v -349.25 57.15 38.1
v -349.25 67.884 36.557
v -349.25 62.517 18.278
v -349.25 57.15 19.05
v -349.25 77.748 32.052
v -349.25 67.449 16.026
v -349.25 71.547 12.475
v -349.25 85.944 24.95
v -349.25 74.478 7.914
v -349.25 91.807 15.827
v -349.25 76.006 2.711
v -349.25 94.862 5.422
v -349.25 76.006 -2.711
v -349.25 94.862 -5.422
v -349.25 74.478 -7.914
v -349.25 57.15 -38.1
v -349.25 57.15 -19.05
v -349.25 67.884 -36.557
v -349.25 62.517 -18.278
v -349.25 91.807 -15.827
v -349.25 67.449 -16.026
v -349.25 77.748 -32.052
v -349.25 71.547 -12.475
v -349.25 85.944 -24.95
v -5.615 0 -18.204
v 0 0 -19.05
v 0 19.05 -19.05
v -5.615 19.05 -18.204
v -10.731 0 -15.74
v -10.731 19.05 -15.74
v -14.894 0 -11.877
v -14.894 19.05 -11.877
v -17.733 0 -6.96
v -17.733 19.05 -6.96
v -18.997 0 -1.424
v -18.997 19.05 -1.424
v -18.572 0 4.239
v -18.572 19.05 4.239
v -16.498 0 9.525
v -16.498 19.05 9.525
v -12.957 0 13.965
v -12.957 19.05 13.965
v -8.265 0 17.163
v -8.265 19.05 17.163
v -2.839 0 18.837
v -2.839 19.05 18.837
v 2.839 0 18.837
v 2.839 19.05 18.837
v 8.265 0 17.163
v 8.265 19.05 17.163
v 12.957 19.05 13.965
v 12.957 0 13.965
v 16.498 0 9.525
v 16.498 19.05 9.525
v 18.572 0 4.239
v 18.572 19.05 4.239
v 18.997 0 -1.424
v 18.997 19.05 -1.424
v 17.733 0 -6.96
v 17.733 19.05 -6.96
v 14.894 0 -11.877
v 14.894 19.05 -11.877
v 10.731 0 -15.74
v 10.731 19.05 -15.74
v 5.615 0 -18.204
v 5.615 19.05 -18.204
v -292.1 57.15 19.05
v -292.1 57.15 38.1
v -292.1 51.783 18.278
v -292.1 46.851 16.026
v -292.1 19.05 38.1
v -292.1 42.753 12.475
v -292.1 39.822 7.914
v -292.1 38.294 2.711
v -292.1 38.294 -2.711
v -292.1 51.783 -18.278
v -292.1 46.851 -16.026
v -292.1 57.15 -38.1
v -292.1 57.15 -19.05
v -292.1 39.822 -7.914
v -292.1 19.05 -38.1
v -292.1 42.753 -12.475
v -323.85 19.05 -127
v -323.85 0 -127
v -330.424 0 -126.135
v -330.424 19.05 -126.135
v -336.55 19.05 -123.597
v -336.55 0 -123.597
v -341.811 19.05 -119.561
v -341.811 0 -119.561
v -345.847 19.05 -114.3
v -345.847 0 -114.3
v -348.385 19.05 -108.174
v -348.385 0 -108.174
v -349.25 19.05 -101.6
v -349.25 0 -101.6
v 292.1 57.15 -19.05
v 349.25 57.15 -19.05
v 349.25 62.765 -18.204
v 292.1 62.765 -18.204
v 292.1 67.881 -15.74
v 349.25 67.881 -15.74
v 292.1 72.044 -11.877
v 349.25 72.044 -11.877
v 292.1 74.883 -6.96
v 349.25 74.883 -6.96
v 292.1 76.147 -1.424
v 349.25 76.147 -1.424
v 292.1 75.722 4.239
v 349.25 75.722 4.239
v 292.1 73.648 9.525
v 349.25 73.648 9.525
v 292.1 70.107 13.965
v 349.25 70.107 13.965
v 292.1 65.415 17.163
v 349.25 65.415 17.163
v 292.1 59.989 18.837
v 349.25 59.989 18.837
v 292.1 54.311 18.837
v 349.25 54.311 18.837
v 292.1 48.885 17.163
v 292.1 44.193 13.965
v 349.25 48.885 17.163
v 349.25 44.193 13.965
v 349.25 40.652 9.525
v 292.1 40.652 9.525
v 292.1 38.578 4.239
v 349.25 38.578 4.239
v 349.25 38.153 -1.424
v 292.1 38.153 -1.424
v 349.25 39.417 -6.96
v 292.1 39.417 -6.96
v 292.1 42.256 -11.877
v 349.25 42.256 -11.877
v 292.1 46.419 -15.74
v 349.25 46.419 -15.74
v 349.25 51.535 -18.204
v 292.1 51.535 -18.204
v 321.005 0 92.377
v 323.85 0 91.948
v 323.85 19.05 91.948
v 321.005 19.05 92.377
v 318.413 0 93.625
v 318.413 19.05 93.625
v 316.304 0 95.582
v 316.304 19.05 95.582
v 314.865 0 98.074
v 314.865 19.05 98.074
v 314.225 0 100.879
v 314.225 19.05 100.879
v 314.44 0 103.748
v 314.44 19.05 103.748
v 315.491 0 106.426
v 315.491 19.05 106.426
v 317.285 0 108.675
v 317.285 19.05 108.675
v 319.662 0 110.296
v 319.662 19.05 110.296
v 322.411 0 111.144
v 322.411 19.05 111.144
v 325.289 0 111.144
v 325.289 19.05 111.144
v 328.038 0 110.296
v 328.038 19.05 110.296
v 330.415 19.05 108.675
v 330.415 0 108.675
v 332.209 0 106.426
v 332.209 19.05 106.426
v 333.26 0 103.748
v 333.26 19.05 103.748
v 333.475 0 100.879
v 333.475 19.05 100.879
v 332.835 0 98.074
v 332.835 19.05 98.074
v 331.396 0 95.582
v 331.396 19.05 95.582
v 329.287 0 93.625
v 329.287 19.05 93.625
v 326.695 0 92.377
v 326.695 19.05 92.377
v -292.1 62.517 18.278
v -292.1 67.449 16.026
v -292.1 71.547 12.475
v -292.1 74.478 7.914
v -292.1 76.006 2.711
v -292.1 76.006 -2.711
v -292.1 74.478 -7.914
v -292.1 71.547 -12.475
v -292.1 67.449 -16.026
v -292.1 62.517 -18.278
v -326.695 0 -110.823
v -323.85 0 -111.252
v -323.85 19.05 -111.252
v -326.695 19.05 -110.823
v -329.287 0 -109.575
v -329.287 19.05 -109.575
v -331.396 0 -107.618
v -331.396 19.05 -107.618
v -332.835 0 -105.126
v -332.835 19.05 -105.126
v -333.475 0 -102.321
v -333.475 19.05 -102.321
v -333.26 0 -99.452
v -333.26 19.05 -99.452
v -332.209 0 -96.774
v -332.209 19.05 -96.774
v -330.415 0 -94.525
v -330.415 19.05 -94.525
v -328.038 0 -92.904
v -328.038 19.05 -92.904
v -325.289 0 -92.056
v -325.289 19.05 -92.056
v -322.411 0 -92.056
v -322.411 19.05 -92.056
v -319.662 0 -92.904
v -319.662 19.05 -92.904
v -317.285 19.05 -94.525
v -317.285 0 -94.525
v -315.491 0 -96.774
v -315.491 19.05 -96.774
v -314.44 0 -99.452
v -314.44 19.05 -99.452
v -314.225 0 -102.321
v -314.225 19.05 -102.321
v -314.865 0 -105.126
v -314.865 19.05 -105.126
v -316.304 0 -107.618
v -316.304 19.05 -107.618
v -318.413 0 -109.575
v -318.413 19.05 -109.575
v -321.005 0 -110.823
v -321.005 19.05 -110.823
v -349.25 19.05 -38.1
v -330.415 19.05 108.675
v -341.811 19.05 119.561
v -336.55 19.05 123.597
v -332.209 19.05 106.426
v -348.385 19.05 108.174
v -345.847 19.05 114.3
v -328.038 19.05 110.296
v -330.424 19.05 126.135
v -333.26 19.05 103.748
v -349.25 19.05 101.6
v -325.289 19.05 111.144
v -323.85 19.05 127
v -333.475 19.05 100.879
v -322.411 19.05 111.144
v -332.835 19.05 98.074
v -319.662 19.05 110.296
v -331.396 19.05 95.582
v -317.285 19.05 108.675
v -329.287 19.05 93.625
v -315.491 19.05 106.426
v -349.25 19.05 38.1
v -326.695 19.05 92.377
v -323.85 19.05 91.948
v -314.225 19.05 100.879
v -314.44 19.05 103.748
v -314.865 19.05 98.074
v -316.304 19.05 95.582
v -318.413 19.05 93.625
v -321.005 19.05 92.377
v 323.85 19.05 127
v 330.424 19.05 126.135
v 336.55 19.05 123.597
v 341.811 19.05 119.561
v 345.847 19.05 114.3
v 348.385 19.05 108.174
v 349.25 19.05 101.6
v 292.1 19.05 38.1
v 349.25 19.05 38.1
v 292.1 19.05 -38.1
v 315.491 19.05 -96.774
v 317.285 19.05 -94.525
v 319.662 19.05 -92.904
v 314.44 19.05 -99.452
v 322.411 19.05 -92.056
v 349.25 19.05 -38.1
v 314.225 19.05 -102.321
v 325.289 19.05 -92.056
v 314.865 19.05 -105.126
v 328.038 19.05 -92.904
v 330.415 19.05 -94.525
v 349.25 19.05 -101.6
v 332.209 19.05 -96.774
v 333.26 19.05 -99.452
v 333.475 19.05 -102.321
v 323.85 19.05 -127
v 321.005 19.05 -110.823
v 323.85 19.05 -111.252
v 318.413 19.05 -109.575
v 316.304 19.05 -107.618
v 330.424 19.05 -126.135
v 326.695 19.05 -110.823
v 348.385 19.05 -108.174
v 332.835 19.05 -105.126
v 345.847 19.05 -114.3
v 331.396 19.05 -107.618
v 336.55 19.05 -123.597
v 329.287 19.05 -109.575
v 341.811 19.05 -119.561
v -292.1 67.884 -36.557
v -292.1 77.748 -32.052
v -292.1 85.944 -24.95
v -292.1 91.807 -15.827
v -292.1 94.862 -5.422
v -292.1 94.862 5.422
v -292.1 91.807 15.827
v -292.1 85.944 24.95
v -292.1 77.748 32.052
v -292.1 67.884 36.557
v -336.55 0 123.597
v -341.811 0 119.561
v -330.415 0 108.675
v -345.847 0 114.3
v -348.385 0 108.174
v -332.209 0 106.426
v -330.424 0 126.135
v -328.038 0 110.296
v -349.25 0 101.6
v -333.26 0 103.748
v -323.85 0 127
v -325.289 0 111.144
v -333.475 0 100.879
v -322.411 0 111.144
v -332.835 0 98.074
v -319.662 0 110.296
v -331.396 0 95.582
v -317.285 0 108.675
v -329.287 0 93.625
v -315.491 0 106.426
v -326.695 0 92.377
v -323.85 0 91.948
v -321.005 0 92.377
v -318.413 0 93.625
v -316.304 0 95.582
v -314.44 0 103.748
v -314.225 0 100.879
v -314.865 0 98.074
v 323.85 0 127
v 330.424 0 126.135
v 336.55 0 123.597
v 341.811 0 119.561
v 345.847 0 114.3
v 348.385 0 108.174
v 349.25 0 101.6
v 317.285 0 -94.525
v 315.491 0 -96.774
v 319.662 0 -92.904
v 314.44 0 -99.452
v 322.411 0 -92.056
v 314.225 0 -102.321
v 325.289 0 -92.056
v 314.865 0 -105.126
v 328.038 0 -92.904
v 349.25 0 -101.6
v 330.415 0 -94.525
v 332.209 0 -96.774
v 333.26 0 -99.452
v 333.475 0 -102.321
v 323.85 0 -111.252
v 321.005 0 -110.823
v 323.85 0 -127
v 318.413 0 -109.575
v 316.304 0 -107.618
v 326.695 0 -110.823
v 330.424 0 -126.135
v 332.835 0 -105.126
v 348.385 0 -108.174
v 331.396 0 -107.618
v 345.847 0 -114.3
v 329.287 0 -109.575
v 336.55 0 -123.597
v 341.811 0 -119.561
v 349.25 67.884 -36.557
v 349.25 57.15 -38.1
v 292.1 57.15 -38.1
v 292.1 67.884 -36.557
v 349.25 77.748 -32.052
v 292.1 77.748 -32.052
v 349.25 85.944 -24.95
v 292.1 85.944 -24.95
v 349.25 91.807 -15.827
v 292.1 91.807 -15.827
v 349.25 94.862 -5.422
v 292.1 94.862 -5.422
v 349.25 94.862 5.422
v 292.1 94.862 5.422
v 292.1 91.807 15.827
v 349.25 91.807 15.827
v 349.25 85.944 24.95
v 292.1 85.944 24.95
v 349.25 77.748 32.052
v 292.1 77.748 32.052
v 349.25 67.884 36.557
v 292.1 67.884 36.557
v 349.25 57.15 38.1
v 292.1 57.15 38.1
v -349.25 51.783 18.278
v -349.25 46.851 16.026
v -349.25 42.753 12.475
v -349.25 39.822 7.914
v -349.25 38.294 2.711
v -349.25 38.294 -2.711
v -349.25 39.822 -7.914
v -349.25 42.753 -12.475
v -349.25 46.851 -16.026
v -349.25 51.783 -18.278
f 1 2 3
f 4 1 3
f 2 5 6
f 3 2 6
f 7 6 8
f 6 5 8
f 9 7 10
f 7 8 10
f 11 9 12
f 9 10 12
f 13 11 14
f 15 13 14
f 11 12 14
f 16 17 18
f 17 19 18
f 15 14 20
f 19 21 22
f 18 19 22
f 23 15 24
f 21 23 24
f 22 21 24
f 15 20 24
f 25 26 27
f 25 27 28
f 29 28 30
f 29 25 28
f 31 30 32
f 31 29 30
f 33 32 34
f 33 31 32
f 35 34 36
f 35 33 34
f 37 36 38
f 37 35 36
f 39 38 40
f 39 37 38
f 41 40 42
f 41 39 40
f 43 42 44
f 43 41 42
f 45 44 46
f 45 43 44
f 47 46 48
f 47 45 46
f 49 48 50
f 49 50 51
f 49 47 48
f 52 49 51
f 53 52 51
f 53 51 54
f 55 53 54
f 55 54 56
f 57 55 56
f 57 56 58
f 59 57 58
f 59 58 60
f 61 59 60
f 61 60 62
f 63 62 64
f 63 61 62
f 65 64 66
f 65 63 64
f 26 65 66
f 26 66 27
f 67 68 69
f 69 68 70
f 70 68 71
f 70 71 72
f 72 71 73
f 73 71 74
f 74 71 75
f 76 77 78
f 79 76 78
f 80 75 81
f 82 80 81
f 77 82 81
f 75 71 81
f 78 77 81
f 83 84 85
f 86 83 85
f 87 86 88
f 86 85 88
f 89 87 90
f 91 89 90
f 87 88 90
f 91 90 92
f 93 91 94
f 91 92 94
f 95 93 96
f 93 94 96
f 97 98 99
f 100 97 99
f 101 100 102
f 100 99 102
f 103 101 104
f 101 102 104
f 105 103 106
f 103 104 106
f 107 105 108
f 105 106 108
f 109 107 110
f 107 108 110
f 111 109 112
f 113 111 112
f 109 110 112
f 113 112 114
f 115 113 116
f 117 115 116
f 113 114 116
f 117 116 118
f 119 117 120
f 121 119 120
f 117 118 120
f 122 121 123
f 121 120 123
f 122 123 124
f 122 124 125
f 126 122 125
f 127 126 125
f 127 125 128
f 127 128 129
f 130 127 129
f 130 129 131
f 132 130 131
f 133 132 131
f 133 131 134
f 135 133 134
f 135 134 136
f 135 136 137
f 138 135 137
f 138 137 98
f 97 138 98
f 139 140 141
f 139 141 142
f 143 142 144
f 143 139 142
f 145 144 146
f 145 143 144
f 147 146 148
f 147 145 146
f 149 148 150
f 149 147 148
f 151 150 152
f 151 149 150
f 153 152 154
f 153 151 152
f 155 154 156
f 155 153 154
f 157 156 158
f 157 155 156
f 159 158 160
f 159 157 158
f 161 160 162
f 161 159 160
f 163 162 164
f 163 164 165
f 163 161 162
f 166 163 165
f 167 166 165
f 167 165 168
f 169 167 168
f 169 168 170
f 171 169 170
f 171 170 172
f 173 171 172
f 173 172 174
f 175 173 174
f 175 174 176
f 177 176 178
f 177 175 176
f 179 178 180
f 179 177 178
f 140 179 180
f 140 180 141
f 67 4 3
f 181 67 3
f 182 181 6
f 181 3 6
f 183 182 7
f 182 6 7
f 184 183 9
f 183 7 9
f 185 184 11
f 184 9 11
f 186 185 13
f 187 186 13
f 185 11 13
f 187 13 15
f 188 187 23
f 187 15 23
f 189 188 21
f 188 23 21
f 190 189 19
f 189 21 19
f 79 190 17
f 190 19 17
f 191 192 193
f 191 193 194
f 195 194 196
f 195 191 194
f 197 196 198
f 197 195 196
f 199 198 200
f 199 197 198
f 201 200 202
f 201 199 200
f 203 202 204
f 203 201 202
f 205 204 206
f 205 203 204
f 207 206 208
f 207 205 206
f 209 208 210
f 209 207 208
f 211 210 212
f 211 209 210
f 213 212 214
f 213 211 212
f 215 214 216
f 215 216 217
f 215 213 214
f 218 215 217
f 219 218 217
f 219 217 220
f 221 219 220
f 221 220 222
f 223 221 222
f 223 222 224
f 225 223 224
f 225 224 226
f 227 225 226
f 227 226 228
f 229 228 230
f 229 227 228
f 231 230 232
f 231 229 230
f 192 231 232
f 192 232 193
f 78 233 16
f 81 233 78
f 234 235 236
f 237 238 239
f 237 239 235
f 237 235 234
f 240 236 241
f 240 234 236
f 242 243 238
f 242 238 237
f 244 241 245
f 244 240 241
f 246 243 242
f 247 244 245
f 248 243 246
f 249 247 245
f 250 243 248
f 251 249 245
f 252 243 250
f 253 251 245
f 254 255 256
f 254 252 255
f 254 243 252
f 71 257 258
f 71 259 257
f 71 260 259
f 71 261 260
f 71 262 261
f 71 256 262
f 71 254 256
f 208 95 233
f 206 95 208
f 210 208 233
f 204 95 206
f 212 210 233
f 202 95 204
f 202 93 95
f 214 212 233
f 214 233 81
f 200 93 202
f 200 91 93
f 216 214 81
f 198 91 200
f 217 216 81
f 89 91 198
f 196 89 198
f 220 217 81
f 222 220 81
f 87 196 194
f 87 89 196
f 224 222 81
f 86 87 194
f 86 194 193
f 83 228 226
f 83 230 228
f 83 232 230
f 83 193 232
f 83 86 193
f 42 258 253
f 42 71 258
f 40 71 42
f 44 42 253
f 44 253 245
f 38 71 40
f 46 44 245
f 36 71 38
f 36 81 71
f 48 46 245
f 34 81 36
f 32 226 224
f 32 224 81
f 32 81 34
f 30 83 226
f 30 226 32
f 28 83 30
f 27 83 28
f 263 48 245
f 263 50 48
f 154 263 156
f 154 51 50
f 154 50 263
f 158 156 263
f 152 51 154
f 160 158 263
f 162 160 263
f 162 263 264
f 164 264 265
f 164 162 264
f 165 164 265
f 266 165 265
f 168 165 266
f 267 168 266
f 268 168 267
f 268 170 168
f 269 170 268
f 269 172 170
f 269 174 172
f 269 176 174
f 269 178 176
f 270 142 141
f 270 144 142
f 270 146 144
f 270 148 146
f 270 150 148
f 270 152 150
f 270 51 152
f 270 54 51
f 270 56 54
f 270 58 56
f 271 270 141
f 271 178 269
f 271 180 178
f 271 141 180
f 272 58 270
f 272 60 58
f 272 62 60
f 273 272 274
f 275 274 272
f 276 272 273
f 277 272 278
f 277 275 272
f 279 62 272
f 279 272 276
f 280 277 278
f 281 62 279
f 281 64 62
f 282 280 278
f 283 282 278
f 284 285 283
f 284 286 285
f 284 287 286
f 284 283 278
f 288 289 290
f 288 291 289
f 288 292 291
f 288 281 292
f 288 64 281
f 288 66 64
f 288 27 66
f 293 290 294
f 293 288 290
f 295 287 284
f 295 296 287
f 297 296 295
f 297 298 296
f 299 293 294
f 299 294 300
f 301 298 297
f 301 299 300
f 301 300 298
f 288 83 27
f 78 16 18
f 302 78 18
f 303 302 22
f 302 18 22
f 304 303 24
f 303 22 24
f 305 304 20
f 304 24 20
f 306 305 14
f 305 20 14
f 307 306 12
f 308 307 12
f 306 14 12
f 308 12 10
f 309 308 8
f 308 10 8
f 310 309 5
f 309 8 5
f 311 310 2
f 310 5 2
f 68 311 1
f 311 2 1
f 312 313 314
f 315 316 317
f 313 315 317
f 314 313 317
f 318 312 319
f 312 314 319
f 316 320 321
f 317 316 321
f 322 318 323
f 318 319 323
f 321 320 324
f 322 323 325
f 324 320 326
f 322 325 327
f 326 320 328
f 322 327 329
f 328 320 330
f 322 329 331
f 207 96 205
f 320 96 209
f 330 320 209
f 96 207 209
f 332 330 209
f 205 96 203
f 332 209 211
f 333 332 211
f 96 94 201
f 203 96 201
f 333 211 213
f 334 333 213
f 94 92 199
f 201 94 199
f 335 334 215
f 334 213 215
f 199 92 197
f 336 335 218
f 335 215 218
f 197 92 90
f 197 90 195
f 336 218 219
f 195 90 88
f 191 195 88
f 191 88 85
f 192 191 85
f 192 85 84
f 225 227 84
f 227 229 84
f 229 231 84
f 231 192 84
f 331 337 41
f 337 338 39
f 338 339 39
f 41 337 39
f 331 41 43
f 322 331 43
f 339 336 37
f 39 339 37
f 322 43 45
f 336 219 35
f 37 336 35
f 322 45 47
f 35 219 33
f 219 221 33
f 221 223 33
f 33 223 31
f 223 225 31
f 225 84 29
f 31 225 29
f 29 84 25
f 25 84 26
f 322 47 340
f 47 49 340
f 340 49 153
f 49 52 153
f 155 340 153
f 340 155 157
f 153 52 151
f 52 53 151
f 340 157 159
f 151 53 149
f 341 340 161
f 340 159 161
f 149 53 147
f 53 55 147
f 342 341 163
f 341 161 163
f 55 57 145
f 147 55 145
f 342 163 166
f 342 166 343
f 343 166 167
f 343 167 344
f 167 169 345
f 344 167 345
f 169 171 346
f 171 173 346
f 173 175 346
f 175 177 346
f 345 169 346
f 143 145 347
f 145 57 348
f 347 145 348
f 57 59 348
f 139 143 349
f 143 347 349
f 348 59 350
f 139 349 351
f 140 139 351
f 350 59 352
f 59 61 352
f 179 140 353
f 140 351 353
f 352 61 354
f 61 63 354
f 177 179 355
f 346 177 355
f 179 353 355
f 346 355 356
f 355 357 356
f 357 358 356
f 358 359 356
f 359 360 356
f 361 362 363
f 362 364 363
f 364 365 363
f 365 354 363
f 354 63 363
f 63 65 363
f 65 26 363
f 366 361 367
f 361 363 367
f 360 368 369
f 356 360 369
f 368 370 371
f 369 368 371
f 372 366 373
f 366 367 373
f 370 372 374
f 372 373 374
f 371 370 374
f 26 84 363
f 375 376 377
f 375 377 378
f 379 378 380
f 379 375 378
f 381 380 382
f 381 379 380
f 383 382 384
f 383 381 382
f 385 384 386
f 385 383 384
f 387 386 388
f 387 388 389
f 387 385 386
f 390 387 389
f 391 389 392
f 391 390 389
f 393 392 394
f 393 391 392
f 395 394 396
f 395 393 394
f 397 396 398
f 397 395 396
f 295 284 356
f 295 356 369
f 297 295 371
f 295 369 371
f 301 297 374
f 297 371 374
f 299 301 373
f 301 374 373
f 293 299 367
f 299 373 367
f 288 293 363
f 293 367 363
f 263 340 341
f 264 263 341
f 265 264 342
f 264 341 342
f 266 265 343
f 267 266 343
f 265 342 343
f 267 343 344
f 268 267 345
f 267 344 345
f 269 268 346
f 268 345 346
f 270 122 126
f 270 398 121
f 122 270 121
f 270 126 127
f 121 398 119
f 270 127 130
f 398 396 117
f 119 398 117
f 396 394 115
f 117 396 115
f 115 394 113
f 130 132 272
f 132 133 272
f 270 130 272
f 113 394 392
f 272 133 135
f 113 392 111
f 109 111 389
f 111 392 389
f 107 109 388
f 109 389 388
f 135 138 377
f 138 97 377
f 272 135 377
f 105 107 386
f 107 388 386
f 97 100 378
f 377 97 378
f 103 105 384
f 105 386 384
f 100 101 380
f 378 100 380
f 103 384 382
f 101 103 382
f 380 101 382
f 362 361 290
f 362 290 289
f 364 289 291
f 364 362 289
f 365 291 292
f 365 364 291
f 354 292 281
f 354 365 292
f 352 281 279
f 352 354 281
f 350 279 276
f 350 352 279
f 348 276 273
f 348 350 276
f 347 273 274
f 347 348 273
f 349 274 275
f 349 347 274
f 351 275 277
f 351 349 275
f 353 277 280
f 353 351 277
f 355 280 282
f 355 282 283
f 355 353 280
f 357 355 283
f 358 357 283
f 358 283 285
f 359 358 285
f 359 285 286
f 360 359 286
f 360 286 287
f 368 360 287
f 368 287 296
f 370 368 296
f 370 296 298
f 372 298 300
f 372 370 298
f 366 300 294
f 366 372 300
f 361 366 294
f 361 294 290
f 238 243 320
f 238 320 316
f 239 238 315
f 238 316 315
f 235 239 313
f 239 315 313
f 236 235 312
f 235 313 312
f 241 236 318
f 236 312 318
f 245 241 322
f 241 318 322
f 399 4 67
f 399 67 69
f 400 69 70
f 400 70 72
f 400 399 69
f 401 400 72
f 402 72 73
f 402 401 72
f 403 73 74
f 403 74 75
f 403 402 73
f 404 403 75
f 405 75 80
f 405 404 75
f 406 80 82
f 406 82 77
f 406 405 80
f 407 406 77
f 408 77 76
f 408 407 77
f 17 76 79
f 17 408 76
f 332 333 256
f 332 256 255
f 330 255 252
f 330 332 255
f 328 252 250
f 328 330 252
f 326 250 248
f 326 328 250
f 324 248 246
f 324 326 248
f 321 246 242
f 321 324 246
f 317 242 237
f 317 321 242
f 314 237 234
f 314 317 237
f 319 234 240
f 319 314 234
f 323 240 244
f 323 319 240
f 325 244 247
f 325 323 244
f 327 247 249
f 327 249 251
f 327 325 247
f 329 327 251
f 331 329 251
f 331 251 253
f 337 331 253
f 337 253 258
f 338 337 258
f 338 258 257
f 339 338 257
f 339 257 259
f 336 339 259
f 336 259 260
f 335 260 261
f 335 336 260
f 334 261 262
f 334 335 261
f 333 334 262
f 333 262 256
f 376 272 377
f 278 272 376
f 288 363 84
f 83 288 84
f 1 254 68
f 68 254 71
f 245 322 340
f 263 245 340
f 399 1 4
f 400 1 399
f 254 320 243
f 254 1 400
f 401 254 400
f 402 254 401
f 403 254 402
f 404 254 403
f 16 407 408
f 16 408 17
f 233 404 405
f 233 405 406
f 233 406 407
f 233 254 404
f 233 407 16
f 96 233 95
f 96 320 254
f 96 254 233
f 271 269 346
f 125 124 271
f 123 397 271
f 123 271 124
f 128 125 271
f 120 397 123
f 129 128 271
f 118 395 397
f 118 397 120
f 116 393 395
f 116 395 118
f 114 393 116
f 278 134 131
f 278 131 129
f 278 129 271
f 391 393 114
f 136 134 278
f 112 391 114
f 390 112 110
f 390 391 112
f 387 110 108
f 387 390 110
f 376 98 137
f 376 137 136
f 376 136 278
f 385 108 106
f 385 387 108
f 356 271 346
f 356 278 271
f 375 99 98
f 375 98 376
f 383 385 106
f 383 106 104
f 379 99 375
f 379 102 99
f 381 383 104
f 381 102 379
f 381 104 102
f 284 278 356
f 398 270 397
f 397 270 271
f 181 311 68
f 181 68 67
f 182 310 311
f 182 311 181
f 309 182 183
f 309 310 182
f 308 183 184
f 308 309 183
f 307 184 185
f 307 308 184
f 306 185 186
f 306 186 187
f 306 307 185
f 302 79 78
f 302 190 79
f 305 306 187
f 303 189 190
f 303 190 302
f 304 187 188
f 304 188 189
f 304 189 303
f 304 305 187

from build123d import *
from build123d.topology import SkipClean

# Parameters (mm, degrees)
SKETCH1_R           = 9.652
SKETCH1_R_2         = 19.05
BOSS_EXTRUDE1_DEPTH = 19.05
SKETCH1_3_W         = 57.15
SKETCH1_3_H         = 76.2
BOSS_EXTRUDE2_DEPTH = 57.15
BOSS_EXTRUDE3_DEPTH = 57.15
CUT_EXTRUDE2_DEPTH  = 57.15


with BuildPart() as part:
    # Sketch1 → Boss-Extrude1 (new body)
    with BuildSketch(Plane(origin=(0, 0, 0), x_dir=(1, 0, 0), z_dir=(0, 1, 0))):
        with BuildLine():
            ThreePointArc((-349.25, -101.6), (-341.810512242, -119.560512242), (-323.85, -127))
            Line((-323.85, -127), (323.85, -127))
            ThreePointArc((323.85, -127), (341.810512242, -119.560512242), (349.25, -101.6))
            Line((349.25, -101.6), (349.25, -38.1))
            Line((349.25, -38.1), (292.1, -38.1))
            Line((292.1, -38.1), (292.1, 38.1))
            Line((292.1, 38.1), (349.25, 38.1))
            Line((349.25, 38.1), (349.25, 101.6))
            ThreePointArc((349.25, 101.6), (341.810512242, 119.560512242), (323.85, 127))
            Line((323.85, 127), (-323.85, 127))
            ThreePointArc((-323.85, 127), (-341.810512242, 119.560512242), (-349.25, 101.6))
            Line((-349.25, 101.6), (-349.25, 38.1))
            Line((-349.25, 38.1), (-292.1, 38.1))
            Line((-292.1, 38.1), (-292.1, -38.1))
            Line((-292.1, -38.1), (-349.25, -38.1))
            Line((-349.25, -38.1), (-349.25, -101.6))
        make_face()
        with Locations((-323.85, -101.6)):
            Circle(SKETCH1_R, mode=Mode.SUBTRACT)
        with Locations((323.85, -101.6)):
            Circle(SKETCH1_R, mode=Mode.SUBTRACT)
        with Locations((-323.85, 101.6)):
            Circle(SKETCH1_R, mode=Mode.SUBTRACT)
        Circle(SKETCH1_R_2, mode=Mode.SUBTRACT)
        with Locations((323.85, 101.6)):
            Circle(SKETCH1_R, mode=Mode.SUBTRACT)
    extrude(amount=BOSS_EXTRUDE1_DEPTH)

    # Sketch1<3> → Boss-Extrude2 (add)
    with BuildSketch(Plane(origin=(0, 0, 0), x_dir=(1, 0, 0), z_dir=(0, 1, 0))):
        with Locations((-320.675, 0)):
            Rectangle(SKETCH1_3_W, SKETCH1_3_H)
        with Locations((320.675, 0)):
            Rectangle(SKETCH1_3_W, SKETCH1_3_H)
    extrude(amount=BOSS_EXTRUDE2_DEPTH)

    # Sketch2 → Boss-Extrude3 (add)
    with BuildSketch(Plane(origin=(349.25, 0, 0), x_dir=(0, 0, -1), z_dir=(1, 0, 0))):
        with BuildLine():
            Line((19.05, 57.15), (38.1, 57.15))
            ThreePointArc((38.1, 57.15), (0, 95.25), (-38.1, 57.15))
            Line((-38.1, 57.15), (-19.05, 57.15))
            ThreePointArc((-19.05, 57.15), (0, 76.2), (19.05, 57.15))
        make_face()
    boss_extrude3 = extrude(amount=-BOSS_EXTRUDE3_DEPTH)

    # Sketch2<4> → Cut-Extrude2 (cut)
    with SkipClean():  # the faces are left unmerged after this step: merging them gives an invalid solid
        with BuildSketch(Plane(origin=(349.25, 0, 0), x_dir=(0, 0, -1), z_dir=(1, 0, 0))):
            with BuildLine():
                ThreePointArc((-19.05, 57.15), (0, 38.1), (19.05, 57.15))
                Line((19.05, 57.15), (-19.05, 57.15))
            make_face()
        cut_extrude2 = extrude(amount=-CUT_EXTRUDE2_DEPTH, mode=Mode.SUBTRACT)
    add(part.part.scale(1), mode=Mode.REPLACE)  # the faces are merged on a copy

    # Mirror1: Boss-Extrude3, Cut-Extrude2 across plane
    with SkipClean():  # the faces are left unmerged after this step: merging them gives an invalid solid
        add(boss_extrude3.mirror(Plane(origin=(0, 0, 0), x_dir=(0, 0, 1), z_dir=(1, 0, 0))))
        add(cut_extrude2.mirror(Plane(origin=(0, 0, 0), x_dir=(0, 0, 1), z_dir=(1, 0, 0))), mode=Mode.SUBTRACT)


solid = part.part
